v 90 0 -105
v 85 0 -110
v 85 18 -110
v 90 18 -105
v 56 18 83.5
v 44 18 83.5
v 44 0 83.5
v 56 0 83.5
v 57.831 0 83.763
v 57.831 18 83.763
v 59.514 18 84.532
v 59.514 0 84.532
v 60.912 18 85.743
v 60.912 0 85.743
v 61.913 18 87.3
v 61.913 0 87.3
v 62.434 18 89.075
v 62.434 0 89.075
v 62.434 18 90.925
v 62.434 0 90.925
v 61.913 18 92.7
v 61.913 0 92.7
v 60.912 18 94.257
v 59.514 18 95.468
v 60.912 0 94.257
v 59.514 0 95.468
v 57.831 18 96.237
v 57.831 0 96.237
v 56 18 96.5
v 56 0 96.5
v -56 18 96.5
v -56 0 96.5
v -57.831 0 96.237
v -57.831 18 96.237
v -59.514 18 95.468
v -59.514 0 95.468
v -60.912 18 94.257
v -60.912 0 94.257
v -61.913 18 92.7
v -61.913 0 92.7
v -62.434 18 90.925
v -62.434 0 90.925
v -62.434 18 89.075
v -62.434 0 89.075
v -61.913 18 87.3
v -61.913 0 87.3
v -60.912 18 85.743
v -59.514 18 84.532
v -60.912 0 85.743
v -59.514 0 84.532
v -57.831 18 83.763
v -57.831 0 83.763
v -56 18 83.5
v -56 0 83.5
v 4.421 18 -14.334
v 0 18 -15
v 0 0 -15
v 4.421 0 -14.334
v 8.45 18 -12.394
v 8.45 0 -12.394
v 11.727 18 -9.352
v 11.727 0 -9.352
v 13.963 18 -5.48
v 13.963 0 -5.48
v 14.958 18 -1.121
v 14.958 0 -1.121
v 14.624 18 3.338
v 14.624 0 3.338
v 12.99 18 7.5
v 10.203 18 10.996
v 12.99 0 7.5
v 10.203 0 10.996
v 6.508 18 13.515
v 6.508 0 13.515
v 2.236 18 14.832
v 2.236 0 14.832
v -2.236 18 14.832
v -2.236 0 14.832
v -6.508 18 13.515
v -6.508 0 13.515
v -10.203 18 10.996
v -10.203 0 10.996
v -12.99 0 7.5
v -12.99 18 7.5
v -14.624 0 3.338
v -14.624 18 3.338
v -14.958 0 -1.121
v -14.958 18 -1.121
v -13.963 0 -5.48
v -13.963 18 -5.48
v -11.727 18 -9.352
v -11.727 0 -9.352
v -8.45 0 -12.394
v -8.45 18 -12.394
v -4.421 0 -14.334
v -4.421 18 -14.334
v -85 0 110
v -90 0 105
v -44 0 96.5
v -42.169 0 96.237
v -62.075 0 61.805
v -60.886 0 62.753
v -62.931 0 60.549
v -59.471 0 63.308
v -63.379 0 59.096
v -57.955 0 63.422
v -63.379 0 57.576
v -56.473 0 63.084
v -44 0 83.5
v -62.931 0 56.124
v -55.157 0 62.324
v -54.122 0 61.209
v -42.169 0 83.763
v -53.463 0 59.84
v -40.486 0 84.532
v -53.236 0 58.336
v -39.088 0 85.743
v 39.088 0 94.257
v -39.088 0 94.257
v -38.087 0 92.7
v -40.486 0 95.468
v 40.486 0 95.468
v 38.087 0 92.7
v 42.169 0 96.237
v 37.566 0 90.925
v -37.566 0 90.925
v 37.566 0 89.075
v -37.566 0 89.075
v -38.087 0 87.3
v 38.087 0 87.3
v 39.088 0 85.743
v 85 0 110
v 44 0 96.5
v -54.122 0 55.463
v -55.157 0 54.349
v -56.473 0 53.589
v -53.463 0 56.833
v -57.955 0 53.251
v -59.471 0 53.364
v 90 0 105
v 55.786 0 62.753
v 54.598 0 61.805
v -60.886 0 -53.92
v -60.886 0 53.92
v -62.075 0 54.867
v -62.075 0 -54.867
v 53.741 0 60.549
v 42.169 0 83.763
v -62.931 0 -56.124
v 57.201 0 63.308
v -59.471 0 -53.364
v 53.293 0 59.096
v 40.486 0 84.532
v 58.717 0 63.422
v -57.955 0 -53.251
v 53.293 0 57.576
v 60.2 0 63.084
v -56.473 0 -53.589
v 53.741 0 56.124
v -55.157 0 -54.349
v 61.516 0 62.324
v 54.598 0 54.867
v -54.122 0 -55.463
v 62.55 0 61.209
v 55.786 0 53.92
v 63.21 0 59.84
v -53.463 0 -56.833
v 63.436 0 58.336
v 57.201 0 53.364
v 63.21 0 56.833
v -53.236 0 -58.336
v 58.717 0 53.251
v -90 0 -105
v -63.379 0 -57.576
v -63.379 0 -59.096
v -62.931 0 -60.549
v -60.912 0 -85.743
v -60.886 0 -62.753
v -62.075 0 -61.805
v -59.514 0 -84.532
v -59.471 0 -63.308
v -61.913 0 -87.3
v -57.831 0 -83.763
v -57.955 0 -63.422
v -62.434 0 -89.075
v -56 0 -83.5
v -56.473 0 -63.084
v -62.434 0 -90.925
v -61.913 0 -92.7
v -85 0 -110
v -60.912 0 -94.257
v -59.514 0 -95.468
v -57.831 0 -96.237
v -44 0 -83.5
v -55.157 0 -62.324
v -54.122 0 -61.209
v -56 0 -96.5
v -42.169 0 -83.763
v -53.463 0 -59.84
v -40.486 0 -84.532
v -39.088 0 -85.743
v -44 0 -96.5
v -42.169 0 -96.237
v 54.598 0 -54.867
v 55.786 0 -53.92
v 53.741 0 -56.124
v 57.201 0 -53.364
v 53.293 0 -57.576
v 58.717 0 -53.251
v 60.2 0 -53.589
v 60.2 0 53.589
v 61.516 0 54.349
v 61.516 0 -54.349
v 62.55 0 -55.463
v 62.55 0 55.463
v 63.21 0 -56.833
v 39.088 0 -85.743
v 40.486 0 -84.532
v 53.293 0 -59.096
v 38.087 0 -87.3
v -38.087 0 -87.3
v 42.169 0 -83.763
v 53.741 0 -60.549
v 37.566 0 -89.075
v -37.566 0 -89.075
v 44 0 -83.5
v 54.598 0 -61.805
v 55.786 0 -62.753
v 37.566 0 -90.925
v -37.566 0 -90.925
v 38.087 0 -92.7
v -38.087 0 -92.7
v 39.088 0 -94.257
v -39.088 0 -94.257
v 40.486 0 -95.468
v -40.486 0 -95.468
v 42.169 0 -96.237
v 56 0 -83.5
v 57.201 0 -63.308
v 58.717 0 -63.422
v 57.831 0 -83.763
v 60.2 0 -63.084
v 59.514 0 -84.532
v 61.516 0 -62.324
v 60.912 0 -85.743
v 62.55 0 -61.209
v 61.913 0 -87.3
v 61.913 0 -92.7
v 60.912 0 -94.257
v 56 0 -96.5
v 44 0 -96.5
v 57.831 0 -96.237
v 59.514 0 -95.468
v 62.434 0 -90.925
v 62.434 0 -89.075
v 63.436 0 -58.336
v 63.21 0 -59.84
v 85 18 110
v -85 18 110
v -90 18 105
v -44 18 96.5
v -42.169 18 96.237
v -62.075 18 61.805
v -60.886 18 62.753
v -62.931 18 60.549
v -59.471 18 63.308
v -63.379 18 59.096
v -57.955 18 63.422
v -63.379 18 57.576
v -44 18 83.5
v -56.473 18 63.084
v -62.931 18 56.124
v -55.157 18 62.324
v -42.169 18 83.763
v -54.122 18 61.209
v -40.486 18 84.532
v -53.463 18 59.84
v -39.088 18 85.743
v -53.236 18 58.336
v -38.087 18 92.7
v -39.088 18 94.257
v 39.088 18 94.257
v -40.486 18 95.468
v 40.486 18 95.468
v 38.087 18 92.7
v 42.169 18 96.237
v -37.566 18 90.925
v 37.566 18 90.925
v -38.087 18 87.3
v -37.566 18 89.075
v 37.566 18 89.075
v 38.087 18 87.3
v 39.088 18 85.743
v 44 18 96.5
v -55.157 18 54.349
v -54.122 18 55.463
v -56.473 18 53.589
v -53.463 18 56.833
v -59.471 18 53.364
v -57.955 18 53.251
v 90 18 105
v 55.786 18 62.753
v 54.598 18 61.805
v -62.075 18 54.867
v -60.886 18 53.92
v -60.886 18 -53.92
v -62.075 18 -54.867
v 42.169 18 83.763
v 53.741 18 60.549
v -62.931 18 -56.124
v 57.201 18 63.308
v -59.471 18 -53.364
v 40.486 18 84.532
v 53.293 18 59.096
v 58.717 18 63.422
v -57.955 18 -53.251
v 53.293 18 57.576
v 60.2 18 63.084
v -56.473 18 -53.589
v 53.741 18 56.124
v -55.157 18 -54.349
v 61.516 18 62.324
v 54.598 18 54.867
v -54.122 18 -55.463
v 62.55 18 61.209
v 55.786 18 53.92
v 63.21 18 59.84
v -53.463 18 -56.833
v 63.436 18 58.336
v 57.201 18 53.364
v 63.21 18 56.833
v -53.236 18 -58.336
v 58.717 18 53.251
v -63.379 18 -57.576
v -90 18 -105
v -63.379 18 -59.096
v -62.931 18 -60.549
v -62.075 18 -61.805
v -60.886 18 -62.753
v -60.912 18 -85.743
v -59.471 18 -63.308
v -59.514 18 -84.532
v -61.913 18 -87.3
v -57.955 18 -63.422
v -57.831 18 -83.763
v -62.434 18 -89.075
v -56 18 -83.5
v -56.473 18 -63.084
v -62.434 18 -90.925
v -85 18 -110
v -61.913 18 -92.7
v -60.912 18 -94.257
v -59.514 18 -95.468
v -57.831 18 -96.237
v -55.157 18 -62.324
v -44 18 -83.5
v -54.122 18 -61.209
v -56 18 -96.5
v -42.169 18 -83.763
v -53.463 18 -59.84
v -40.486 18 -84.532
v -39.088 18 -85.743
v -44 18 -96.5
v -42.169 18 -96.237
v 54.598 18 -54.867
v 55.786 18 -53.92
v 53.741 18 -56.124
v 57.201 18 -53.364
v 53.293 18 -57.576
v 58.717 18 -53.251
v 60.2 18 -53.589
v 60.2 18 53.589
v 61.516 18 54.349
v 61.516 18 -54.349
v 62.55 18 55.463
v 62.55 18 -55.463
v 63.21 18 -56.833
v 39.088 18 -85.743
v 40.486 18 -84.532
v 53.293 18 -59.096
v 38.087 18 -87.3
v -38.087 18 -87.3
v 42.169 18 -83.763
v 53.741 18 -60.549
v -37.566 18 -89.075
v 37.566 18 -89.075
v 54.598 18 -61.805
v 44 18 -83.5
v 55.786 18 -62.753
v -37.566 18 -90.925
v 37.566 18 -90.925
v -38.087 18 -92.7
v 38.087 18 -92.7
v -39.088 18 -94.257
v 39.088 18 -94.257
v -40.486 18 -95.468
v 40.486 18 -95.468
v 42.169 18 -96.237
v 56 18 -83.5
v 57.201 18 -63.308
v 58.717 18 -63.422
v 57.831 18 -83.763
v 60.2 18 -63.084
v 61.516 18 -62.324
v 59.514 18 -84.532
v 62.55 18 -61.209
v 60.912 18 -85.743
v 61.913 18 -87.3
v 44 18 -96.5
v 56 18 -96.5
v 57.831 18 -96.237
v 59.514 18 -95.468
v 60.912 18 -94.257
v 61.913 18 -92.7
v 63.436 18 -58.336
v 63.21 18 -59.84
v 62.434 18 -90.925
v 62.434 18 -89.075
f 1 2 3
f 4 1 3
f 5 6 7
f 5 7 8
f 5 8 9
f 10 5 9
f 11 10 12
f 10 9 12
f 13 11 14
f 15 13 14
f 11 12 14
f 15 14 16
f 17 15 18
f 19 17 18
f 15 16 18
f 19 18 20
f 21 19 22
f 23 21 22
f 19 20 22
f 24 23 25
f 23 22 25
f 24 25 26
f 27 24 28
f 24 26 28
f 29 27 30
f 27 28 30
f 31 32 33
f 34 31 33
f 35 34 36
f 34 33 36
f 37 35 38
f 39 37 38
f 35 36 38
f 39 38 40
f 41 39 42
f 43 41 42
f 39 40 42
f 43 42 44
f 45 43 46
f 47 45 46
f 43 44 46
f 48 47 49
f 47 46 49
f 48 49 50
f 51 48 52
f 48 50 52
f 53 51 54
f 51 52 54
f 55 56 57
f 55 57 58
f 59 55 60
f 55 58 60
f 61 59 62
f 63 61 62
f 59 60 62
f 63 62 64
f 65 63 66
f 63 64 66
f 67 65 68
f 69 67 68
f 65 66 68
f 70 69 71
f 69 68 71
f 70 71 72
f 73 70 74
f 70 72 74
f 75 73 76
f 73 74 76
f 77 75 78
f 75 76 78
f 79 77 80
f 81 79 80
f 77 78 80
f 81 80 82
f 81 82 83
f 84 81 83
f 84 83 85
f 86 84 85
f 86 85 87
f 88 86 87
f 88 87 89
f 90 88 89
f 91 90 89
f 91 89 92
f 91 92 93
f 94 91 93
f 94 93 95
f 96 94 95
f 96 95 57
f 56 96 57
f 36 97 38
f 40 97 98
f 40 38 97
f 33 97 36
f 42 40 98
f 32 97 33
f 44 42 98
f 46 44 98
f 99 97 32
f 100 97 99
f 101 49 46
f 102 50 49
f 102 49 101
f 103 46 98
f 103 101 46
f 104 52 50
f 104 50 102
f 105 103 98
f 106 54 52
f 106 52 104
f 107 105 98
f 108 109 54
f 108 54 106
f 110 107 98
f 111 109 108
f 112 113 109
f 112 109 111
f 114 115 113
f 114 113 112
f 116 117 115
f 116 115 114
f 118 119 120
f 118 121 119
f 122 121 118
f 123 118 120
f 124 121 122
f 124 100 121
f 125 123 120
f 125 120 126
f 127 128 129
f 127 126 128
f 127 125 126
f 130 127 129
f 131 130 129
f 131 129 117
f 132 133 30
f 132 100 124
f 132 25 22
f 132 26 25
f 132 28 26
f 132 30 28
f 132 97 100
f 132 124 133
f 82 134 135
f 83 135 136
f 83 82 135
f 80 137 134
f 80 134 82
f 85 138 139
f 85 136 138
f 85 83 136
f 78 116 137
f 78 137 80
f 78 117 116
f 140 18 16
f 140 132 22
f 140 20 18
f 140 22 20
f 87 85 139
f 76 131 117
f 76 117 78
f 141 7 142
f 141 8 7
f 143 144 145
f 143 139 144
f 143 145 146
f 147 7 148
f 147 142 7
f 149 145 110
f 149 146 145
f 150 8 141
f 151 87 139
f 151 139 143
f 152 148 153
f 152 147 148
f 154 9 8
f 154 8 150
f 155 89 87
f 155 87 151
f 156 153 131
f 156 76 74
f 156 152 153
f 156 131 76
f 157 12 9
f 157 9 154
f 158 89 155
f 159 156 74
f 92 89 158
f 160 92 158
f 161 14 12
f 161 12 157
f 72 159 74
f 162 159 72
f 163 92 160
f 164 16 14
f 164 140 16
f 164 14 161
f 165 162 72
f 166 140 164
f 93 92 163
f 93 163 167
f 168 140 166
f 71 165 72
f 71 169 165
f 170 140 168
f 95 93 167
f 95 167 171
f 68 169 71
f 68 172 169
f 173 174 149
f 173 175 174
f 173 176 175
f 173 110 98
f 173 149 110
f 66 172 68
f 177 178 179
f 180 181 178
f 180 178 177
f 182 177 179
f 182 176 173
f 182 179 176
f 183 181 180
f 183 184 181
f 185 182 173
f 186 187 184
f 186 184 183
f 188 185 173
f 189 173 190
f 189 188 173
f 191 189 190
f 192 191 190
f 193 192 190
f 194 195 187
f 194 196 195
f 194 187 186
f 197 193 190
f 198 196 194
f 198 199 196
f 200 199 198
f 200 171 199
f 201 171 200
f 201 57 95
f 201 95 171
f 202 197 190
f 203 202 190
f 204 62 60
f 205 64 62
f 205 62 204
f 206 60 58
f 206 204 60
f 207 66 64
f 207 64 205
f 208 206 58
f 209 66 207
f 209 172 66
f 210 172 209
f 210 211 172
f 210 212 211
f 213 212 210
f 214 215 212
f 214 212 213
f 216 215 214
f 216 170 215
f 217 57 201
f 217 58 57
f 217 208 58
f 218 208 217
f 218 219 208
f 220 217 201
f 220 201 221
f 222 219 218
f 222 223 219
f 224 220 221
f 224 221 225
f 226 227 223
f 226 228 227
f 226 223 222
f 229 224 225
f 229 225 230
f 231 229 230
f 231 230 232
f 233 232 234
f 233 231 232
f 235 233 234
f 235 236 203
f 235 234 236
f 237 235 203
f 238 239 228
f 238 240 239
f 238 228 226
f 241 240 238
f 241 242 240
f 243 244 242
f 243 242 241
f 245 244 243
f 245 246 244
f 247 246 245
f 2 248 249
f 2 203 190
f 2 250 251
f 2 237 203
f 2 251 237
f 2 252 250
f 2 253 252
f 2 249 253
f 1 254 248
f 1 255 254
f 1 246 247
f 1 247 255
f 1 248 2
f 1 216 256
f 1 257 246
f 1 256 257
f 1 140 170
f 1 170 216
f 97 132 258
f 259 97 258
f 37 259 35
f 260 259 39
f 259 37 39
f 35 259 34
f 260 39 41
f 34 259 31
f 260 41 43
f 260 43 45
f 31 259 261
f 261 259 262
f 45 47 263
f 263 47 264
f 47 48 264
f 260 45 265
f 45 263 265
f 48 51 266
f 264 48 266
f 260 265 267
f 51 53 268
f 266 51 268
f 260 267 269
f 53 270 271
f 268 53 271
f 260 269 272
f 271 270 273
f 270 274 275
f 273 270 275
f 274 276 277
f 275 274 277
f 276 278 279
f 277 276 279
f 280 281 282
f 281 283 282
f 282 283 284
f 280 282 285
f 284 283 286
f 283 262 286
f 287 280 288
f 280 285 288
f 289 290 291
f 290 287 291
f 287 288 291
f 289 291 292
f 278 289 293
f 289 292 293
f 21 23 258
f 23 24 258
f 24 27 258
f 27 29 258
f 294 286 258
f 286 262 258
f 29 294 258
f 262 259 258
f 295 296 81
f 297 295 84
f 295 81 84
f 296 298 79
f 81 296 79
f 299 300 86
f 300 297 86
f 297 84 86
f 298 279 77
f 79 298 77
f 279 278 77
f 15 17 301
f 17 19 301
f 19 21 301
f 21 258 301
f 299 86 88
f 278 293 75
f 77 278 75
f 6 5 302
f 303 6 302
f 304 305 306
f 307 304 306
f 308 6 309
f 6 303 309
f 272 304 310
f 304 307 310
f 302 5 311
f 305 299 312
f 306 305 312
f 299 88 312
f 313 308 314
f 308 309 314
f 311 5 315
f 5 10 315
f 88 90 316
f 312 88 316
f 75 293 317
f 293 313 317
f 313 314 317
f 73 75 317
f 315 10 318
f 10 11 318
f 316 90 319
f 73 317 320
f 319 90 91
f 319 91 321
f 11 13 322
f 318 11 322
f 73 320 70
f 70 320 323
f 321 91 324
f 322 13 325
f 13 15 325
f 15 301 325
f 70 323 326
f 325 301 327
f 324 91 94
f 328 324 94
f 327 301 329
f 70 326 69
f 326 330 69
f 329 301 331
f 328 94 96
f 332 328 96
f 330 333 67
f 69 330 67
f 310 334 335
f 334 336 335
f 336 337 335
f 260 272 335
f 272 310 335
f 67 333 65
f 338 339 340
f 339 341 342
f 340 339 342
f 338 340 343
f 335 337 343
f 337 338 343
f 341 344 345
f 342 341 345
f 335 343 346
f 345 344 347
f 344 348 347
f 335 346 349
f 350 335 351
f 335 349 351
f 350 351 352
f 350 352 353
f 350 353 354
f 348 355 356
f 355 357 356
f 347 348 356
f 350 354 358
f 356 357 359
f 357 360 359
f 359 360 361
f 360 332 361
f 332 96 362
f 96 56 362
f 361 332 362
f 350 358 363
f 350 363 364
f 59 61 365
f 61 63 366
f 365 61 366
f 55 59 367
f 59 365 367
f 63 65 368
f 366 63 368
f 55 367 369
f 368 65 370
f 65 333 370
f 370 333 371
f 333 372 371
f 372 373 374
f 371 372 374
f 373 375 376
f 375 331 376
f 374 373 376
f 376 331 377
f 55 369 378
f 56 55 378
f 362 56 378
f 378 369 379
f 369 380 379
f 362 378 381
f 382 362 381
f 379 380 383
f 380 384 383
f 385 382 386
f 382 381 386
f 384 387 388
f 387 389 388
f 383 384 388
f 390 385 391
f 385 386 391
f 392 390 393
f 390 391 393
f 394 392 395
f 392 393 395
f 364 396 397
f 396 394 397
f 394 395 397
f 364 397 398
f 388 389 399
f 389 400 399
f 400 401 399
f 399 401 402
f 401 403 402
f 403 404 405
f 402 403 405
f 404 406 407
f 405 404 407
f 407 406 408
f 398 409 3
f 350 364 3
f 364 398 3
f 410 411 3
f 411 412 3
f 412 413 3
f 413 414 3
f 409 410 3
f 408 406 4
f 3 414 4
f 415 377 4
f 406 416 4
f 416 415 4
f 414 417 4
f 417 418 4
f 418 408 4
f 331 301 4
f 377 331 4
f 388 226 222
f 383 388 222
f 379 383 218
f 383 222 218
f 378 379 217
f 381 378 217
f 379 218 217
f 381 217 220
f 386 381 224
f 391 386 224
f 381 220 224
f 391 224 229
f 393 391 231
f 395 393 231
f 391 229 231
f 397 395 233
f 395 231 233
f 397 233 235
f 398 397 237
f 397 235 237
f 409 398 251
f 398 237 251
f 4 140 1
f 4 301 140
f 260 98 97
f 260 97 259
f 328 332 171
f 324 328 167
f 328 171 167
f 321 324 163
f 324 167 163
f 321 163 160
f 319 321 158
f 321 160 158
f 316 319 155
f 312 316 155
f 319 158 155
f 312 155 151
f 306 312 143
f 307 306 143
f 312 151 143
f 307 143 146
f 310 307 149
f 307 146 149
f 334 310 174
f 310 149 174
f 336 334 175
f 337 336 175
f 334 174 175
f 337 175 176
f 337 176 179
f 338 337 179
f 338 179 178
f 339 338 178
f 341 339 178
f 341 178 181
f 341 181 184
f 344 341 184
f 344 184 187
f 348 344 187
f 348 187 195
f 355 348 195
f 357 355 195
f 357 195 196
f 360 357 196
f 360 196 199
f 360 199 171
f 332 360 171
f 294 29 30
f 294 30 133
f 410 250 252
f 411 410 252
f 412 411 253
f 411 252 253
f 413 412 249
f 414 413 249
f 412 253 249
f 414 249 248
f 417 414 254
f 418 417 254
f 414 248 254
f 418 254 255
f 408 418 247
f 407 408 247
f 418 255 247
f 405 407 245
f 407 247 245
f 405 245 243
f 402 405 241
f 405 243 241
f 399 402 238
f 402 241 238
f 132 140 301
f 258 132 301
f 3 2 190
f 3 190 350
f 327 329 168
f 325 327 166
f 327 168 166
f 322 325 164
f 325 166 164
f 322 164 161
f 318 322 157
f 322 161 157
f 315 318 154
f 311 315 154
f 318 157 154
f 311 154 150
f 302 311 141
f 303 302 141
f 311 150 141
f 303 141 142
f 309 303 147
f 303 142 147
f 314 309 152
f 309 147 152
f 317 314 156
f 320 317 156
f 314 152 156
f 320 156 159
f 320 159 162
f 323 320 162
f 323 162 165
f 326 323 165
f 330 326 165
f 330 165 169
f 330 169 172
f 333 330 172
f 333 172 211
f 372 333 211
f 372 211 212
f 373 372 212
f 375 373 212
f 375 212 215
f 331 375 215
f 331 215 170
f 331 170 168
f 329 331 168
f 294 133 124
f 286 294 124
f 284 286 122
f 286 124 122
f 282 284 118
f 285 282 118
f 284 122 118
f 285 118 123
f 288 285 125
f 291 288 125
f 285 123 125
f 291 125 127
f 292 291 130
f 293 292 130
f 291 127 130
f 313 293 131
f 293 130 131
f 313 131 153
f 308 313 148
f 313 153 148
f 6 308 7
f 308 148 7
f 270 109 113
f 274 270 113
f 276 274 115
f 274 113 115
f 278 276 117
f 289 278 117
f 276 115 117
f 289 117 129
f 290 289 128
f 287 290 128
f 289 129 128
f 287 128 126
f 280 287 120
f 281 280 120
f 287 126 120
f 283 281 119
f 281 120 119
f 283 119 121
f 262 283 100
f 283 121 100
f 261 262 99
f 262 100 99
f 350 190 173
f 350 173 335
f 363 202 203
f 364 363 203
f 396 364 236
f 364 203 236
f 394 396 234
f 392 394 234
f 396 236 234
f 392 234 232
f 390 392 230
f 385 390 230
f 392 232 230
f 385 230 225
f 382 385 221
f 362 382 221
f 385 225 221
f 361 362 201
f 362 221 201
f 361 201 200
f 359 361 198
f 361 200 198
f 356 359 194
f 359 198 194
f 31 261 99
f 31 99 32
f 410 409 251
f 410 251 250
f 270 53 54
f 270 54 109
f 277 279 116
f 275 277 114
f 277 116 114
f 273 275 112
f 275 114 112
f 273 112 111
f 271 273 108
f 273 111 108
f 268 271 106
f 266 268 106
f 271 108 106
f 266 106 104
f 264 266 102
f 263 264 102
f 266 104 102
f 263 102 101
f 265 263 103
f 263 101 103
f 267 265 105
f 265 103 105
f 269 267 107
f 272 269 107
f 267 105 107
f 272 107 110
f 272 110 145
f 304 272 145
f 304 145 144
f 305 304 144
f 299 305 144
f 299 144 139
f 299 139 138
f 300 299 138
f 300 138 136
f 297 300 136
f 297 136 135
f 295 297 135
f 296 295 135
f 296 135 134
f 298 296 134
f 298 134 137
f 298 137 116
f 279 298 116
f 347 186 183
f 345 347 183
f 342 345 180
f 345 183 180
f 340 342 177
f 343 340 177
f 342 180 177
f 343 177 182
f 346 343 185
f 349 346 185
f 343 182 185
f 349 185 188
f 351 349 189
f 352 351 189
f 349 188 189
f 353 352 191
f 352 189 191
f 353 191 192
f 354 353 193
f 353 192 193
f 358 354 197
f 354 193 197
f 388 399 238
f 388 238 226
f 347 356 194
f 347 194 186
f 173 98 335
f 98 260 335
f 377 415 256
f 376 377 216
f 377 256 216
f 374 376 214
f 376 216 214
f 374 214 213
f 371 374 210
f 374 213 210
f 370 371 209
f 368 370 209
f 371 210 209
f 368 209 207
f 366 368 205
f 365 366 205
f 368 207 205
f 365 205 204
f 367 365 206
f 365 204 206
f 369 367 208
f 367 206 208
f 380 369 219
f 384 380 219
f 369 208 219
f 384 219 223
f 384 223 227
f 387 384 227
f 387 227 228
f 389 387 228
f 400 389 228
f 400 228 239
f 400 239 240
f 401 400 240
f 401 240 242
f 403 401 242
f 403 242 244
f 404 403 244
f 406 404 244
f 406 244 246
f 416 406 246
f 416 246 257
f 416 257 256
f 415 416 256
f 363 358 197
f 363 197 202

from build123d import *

# Parameters (mm, degrees)
SKETCH_1_W          = 220
SKETCH_1_H          = 18
EXTRUDE_1_DEPTH     = 90
CUT_EXTRUDE_1_REACH = 145.262
SKETCH_2_R          = 15
CHAMFER_1_SIZE      = 5
CUT_EXTRUDE_3_REACH = 145.262
HOLE_WIZARD_M12_1_D = 10.2


with BuildPart() as part:
    # 草圖1 → 伸長1 (new, symmetric)
    with BuildSketch(Plane(origin=(0, 0, 0), x_dir=(0, 0, -1), z_dir=(1, 0, 0))):
        with Locations((0, 9)):
            Rectangle(SKETCH_1_W, SKETCH_1_H)
    extrude(amount=EXTRUDE_1_DEPTH, both=True)

    # 草圖2 → 除料-伸長1 (cut, up to next)
    with BuildSketch(Plane.XZ, mode=Mode.PRIVATE) as cut_extrude_1_sk1:
        with Locations(Location((0, 0, 0), (0, 0, 270))):
            Circle(SKETCH_2_R)
    cut_extrude_1_tool1 = extrude(cut_extrude_1_sk1.sketch, amount=-CUT_EXTRUDE_1_REACH, mode=Mode.PRIVATE) & part.part
    add(cut_extrude_1_tool1.solids().sort_by_distance((0, 0, 0))[0], mode=Mode.SUBTRACT)

    # 導角1
    chamfer_1_edges = [part.edges().sort_by_distance(p)[0] for p in [
        (90, 9, 110),
        (90, 9, -110),
        (-90, 9, 110),
        (-90, 9, -110),
    ]]
    chamfer(chamfer_1_edges, length=CHAMFER_1_SIZE)

    # 草圖4 → 除料-伸長3 (cut, up to next)
    with BuildSketch(Plane.XZ, mode=Mode.PRIVATE) as cut_extrude_3_sk1:
        with BuildLine():
            Line((44, 83.5), (56, 83.5))
            ThreePointArc((56, 83.5), (62.5, 90), (56, 96.5))
            Line((56, 96.5), (44, 96.5))
            ThreePointArc((44, 96.5), (37.5, 90), (44, 83.5))
        make_face()
    cut_extrude_3_tool1 = extrude(cut_extrude_3_sk1.sketch, amount=-CUT_EXTRUDE_3_REACH, mode=Mode.PRIVATE) & part.part
    # 草圖4 → 除料-伸長3 (cut, up to next)
    with BuildSketch(Plane.XZ, mode=Mode.PRIVATE) as cut_extrude_3_sk2:
        with BuildLine():
            Line((-56, 83.5), (-44, 83.5))
            ThreePointArc((-44, 83.5), (-37.5, 90), (-44, 96.5))
            Line((-44, 96.5), (-56, 96.5))
            ThreePointArc((-56, 96.5), (-62.5, 90), (-56, 83.5))
        make_face()
    cut_extrude_3_tool2 = extrude(cut_extrude_3_sk2.sketch, amount=-CUT_EXTRUDE_3_REACH, mode=Mode.PRIVATE) & part.part
    # 草圖4 → 除料-伸長3 (cut, up to next)
    with BuildSketch(Plane.XZ, mode=Mode.PRIVATE) as cut_extrude_3_sk3:
        with BuildLine():
            Line((-56, -96.5), (-44, -96.5))
            ThreePointArc((-44, -96.5), (-37.5, -90), (-44, -83.5))
            Line((-44, -83.5), (-56, -83.5))
            ThreePointArc((-56, -83.5), (-62.5, -90), (-56, -96.5))
        make_face()
    cut_extrude_3_tool3 = extrude(cut_extrude_3_sk3.sketch, amount=-CUT_EXTRUDE_3_REACH, mode=Mode.PRIVATE) & part.part
    # 草圖4 → 除料-伸長3 (cut, up to next)
    with BuildSketch(Plane.XZ, mode=Mode.PRIVATE) as cut_extrude_3_sk4:
        with BuildLine():
            Line((44, -96.5), (56, -96.5))
            ThreePointArc((56, -96.5), (62.5, -90), (56, -83.5))
            Line((56, -83.5), (44, -83.5))
            ThreePointArc((44, -83.5), (37.5, -90), (44, -96.5))
        make_face()
    cut_extrude_3_tool4 = extrude(cut_extrude_3_sk4.sketch, amount=-CUT_EXTRUDE_3_REACH, mode=Mode.PRIVATE) & part.part
    add(cut_extrude_3_tool1.solids().sort_by_distance((50, 0, 90))[0], mode=Mode.SUBTRACT)
    add(cut_extrude_3_tool2.solids().sort_by_distance((-50, 0, 90))[0], mode=Mode.SUBTRACT)
    add(cut_extrude_3_tool3.solids().sort_by_distance((-50, 0, -90))[0], mode=Mode.SUBTRACT)
    add(cut_extrude_3_tool4.solids().sort_by_distance((50, 0, -90))[0], mode=Mode.SUBTRACT)

    # M12 螺紋孔1 (through all)
    with Locations(Plane(origin=(0, 18, 0), x_dir=(-1, 0, 0), z_dir=(0, 1, 0))):
        with Locations((58.336309448, 58.336309448), (58.336309448, -58.336309448), (-58.336309448, -58.336309448), (-58.336309448, 58.336309448)):
            Hole(HOLE_WIZARD_M12_1_D / 2)


solid = part.part
